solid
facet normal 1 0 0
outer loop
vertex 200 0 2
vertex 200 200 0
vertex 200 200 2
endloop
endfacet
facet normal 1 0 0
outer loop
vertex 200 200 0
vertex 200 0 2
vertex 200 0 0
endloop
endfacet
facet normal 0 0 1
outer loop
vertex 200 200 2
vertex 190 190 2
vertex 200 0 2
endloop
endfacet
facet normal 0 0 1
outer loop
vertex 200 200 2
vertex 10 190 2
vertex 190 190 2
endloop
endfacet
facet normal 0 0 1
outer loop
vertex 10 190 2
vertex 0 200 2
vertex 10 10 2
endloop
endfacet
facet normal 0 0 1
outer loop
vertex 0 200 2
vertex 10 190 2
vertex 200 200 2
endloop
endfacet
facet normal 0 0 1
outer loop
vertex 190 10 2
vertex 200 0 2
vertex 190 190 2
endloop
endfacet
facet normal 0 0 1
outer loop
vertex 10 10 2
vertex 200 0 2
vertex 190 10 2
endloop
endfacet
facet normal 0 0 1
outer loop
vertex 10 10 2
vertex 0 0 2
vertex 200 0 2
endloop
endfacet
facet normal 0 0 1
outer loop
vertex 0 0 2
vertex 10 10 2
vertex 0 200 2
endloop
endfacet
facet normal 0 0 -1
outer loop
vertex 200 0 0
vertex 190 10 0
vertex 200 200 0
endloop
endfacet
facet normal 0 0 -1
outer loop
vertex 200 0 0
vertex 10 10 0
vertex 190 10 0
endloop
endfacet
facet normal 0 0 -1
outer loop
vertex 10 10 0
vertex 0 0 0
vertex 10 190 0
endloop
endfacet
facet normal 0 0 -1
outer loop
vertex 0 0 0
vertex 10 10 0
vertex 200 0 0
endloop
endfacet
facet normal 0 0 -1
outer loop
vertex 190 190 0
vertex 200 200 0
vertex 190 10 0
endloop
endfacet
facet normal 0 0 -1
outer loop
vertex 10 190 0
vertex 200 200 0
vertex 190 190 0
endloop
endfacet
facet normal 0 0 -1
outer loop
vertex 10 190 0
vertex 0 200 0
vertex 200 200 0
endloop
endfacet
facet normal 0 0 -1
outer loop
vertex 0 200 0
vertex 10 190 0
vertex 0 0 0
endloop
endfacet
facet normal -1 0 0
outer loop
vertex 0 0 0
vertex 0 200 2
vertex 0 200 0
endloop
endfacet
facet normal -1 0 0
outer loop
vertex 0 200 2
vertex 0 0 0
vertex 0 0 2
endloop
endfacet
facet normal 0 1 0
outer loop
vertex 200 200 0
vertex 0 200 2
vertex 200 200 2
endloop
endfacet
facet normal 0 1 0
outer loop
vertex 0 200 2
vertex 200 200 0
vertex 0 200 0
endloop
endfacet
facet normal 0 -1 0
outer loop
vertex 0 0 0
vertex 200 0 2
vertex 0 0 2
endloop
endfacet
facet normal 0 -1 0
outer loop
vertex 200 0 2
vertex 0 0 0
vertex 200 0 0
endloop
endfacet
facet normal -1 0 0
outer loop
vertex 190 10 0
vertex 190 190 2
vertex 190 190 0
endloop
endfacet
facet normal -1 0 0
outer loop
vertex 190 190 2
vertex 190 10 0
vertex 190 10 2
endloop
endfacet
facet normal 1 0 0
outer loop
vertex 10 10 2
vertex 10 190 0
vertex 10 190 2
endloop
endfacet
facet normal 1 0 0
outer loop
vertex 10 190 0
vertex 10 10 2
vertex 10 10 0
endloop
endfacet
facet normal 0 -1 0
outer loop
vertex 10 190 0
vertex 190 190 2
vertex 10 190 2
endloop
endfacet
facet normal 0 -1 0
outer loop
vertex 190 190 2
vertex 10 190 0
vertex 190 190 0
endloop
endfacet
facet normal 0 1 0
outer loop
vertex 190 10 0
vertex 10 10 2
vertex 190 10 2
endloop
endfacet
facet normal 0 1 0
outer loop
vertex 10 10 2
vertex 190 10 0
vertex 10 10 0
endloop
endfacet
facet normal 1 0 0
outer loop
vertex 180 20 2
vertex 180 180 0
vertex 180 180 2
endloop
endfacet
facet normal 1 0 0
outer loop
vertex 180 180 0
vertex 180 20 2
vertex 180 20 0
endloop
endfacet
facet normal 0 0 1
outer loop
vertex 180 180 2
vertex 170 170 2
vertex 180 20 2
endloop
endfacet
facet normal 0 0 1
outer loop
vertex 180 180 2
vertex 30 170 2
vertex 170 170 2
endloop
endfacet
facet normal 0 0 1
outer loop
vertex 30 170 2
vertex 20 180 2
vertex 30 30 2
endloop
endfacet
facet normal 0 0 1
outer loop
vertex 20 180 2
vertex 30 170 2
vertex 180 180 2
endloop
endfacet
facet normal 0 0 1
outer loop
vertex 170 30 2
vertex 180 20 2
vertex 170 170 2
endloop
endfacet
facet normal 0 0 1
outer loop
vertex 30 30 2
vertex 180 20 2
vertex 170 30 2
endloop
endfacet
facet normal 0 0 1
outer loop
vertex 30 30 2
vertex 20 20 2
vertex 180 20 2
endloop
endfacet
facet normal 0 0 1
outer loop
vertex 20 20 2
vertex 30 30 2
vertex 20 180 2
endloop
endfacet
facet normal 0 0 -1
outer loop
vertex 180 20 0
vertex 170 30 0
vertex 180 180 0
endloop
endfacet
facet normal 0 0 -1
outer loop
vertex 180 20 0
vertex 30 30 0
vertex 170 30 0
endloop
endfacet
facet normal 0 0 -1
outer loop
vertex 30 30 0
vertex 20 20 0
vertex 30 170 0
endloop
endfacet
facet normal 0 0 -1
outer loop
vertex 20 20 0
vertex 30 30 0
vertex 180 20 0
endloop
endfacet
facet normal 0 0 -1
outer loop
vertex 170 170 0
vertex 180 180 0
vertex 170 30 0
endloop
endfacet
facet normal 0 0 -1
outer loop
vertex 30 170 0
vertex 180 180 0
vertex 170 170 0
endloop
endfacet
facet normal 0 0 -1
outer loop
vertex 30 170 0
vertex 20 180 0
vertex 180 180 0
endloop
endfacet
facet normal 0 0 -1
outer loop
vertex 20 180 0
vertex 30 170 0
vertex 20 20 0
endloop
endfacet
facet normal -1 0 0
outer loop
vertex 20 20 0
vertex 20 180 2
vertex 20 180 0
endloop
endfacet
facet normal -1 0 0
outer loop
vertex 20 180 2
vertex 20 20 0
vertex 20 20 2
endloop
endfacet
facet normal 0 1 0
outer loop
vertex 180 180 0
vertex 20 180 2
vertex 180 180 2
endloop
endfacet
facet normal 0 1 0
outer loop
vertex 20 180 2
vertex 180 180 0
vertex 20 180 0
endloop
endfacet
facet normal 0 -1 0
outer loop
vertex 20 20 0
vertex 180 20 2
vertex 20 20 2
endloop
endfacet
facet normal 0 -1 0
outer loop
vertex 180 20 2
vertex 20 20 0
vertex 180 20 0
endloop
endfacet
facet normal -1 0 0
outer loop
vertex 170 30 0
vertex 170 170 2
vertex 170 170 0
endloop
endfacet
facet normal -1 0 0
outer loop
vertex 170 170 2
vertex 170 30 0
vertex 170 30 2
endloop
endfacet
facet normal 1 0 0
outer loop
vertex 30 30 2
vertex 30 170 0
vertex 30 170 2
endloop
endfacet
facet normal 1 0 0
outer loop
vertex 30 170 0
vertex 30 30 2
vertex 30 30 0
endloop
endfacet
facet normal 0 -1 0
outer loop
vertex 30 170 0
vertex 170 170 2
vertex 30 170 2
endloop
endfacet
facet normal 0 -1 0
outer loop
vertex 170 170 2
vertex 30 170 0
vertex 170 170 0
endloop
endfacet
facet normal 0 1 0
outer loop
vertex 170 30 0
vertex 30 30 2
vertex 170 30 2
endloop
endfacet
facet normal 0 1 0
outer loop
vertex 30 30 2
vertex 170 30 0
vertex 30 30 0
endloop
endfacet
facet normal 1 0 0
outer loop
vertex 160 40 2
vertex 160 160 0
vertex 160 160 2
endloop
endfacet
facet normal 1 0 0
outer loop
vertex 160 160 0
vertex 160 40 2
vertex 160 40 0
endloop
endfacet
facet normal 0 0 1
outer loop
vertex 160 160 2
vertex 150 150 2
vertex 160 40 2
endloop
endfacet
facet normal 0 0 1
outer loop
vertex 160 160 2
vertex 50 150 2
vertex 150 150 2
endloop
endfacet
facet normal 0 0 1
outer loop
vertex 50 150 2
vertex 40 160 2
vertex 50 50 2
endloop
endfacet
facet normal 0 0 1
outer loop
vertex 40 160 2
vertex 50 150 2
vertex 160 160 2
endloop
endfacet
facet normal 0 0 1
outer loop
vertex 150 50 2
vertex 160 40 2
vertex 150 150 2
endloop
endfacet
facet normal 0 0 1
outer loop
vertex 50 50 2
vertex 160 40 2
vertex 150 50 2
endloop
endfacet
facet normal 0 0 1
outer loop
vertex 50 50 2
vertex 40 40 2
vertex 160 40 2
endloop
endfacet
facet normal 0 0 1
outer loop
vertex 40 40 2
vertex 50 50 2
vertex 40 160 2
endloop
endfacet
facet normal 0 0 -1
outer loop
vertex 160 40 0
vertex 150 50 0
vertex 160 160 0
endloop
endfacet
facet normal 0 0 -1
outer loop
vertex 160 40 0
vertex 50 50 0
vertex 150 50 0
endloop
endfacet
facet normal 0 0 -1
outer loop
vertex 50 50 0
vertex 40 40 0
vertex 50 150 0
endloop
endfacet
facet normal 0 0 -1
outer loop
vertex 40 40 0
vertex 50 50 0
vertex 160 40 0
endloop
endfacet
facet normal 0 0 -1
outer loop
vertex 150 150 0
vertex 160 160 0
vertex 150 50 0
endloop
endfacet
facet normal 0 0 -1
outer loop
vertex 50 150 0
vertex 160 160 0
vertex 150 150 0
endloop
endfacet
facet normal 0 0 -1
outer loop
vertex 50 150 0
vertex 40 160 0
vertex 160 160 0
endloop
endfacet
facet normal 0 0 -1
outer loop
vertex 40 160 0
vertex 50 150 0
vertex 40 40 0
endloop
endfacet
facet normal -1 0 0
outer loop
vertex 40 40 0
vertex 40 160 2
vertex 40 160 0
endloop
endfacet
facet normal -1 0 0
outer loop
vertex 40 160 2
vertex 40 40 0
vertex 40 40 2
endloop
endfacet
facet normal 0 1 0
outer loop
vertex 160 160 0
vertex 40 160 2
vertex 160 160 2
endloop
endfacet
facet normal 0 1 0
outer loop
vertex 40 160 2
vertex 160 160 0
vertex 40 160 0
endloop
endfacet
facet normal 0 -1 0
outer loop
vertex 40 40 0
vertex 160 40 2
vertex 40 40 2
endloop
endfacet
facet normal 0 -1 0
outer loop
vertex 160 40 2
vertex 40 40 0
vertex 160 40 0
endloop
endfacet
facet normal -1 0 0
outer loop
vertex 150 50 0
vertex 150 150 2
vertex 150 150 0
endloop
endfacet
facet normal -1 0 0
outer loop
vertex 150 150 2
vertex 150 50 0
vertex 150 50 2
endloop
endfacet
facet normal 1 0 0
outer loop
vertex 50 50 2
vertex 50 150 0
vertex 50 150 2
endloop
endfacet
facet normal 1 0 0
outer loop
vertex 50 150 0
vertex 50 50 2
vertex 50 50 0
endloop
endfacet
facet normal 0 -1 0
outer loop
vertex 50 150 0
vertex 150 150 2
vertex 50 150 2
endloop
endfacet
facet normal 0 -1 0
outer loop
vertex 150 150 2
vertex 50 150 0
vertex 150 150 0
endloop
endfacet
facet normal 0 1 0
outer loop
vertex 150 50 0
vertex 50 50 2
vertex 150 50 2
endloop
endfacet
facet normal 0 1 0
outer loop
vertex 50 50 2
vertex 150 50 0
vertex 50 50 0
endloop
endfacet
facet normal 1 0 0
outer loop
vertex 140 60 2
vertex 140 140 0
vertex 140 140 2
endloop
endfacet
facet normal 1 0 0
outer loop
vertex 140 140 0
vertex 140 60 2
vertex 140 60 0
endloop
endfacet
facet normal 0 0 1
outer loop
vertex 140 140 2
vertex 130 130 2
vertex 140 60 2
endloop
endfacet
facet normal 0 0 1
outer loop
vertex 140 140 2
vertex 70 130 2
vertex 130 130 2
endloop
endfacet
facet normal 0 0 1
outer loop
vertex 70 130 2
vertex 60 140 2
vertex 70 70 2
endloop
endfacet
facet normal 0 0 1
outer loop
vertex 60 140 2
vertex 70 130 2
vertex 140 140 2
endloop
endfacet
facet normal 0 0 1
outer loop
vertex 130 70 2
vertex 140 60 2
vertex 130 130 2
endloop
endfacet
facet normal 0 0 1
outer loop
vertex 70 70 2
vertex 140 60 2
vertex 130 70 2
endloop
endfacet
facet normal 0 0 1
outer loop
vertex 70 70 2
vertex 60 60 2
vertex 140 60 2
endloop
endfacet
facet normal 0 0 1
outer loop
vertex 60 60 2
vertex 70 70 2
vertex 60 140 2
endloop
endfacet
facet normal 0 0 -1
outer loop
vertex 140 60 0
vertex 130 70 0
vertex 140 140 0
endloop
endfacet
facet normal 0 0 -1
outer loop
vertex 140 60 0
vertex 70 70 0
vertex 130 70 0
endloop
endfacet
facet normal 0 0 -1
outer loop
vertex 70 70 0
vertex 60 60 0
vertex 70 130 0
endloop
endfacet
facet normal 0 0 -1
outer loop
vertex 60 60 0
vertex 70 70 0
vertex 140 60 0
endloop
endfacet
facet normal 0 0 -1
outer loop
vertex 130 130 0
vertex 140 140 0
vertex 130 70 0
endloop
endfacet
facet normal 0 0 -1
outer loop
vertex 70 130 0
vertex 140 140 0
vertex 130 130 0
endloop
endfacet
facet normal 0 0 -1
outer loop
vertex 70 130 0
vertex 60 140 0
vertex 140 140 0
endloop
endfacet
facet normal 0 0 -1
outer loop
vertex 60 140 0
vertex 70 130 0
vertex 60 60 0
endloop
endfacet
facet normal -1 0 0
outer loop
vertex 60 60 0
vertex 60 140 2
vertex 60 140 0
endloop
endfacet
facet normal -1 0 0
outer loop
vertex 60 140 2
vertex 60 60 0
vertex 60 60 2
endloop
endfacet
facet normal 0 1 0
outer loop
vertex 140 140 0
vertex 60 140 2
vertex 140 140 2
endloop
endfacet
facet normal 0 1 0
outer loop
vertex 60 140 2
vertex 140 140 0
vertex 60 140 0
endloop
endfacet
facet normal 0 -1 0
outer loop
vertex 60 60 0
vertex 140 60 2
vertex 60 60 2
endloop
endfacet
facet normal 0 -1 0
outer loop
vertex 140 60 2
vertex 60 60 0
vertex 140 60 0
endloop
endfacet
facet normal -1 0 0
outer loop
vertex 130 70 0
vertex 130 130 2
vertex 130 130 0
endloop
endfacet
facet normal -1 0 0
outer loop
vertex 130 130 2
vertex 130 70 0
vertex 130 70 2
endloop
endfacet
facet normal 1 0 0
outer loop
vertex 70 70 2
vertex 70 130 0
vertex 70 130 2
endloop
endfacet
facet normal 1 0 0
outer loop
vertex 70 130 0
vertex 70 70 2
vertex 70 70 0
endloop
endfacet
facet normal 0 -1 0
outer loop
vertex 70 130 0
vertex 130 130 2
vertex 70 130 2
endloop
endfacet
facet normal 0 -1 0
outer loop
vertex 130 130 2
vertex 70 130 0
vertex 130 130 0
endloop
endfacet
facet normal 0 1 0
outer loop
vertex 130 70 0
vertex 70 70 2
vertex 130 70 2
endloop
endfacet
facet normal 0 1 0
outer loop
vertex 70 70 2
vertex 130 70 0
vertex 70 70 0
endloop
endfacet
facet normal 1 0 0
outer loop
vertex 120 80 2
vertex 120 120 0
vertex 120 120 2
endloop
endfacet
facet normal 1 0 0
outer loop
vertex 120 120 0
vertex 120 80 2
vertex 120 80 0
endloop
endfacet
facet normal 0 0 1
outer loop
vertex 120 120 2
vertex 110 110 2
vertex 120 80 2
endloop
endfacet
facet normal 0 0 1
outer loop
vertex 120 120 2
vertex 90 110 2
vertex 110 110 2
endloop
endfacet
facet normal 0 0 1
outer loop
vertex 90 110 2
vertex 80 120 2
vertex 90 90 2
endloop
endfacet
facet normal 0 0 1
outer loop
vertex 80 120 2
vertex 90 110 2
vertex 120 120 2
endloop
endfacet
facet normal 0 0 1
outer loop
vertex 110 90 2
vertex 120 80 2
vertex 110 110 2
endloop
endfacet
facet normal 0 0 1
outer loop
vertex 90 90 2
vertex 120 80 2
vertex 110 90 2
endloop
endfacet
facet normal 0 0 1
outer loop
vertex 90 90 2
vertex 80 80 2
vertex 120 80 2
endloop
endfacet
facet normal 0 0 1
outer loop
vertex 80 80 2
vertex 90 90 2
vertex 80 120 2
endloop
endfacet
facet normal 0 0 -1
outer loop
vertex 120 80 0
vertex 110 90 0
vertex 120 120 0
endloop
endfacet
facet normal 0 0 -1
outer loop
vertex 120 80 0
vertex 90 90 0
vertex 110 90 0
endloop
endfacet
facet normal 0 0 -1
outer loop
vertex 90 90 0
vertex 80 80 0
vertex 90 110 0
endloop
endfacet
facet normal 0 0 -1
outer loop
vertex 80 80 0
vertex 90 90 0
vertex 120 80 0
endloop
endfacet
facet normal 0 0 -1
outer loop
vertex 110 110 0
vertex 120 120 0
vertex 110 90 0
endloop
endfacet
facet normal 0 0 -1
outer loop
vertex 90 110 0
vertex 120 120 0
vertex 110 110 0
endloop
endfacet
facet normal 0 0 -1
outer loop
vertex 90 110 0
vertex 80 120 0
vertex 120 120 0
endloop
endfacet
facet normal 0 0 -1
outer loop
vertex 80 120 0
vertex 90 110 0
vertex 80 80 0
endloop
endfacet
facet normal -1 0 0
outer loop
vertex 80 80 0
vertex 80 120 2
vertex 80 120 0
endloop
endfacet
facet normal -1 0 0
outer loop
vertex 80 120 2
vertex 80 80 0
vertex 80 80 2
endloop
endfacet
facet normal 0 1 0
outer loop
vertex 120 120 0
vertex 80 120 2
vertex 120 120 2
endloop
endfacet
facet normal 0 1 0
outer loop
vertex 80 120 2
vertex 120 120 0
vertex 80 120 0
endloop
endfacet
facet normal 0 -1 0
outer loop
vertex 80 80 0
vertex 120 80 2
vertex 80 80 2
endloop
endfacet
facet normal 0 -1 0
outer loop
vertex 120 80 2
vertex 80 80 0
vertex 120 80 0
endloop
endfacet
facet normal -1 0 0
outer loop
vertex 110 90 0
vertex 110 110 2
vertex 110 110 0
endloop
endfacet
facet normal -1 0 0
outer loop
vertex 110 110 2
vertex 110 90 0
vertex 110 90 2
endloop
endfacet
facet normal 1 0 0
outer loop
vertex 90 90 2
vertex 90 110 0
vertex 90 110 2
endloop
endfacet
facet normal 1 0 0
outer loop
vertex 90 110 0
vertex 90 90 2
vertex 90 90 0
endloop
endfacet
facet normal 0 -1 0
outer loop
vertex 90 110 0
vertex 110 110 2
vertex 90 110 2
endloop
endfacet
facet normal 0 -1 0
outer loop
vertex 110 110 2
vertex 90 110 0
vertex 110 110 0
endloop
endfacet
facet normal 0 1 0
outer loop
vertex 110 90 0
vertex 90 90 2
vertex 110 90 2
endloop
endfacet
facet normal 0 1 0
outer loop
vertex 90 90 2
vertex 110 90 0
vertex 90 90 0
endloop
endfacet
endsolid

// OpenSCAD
difference() {
    cube([200,200,2]);
    translate([10,10,0]) {
        cube([180,180,2]);
    }
}
translate([20,20,0]) {
    difference() {
        cube([160,160,2]);
        translate([10,10,0]) {
            cube([140,140,2]);
        }
    }
}

translate([40,40,0]) {
    difference() {
        cube([120,120,2]);
        translate([10,10,0]) {
            cube([100,100,2]);
        }
    }
}

translate([60,60,0]) {
    difference() {
        cube([80,80,2]);
        translate([10,10,0]) {
            cube([60,60,2]);
        }
    }
}

translate([80,80,0]) {
    difference() {
        cube([40,40,2]);
        translate([10,10,0]) {
            cube([20,20,2]);
        }
    }
}
